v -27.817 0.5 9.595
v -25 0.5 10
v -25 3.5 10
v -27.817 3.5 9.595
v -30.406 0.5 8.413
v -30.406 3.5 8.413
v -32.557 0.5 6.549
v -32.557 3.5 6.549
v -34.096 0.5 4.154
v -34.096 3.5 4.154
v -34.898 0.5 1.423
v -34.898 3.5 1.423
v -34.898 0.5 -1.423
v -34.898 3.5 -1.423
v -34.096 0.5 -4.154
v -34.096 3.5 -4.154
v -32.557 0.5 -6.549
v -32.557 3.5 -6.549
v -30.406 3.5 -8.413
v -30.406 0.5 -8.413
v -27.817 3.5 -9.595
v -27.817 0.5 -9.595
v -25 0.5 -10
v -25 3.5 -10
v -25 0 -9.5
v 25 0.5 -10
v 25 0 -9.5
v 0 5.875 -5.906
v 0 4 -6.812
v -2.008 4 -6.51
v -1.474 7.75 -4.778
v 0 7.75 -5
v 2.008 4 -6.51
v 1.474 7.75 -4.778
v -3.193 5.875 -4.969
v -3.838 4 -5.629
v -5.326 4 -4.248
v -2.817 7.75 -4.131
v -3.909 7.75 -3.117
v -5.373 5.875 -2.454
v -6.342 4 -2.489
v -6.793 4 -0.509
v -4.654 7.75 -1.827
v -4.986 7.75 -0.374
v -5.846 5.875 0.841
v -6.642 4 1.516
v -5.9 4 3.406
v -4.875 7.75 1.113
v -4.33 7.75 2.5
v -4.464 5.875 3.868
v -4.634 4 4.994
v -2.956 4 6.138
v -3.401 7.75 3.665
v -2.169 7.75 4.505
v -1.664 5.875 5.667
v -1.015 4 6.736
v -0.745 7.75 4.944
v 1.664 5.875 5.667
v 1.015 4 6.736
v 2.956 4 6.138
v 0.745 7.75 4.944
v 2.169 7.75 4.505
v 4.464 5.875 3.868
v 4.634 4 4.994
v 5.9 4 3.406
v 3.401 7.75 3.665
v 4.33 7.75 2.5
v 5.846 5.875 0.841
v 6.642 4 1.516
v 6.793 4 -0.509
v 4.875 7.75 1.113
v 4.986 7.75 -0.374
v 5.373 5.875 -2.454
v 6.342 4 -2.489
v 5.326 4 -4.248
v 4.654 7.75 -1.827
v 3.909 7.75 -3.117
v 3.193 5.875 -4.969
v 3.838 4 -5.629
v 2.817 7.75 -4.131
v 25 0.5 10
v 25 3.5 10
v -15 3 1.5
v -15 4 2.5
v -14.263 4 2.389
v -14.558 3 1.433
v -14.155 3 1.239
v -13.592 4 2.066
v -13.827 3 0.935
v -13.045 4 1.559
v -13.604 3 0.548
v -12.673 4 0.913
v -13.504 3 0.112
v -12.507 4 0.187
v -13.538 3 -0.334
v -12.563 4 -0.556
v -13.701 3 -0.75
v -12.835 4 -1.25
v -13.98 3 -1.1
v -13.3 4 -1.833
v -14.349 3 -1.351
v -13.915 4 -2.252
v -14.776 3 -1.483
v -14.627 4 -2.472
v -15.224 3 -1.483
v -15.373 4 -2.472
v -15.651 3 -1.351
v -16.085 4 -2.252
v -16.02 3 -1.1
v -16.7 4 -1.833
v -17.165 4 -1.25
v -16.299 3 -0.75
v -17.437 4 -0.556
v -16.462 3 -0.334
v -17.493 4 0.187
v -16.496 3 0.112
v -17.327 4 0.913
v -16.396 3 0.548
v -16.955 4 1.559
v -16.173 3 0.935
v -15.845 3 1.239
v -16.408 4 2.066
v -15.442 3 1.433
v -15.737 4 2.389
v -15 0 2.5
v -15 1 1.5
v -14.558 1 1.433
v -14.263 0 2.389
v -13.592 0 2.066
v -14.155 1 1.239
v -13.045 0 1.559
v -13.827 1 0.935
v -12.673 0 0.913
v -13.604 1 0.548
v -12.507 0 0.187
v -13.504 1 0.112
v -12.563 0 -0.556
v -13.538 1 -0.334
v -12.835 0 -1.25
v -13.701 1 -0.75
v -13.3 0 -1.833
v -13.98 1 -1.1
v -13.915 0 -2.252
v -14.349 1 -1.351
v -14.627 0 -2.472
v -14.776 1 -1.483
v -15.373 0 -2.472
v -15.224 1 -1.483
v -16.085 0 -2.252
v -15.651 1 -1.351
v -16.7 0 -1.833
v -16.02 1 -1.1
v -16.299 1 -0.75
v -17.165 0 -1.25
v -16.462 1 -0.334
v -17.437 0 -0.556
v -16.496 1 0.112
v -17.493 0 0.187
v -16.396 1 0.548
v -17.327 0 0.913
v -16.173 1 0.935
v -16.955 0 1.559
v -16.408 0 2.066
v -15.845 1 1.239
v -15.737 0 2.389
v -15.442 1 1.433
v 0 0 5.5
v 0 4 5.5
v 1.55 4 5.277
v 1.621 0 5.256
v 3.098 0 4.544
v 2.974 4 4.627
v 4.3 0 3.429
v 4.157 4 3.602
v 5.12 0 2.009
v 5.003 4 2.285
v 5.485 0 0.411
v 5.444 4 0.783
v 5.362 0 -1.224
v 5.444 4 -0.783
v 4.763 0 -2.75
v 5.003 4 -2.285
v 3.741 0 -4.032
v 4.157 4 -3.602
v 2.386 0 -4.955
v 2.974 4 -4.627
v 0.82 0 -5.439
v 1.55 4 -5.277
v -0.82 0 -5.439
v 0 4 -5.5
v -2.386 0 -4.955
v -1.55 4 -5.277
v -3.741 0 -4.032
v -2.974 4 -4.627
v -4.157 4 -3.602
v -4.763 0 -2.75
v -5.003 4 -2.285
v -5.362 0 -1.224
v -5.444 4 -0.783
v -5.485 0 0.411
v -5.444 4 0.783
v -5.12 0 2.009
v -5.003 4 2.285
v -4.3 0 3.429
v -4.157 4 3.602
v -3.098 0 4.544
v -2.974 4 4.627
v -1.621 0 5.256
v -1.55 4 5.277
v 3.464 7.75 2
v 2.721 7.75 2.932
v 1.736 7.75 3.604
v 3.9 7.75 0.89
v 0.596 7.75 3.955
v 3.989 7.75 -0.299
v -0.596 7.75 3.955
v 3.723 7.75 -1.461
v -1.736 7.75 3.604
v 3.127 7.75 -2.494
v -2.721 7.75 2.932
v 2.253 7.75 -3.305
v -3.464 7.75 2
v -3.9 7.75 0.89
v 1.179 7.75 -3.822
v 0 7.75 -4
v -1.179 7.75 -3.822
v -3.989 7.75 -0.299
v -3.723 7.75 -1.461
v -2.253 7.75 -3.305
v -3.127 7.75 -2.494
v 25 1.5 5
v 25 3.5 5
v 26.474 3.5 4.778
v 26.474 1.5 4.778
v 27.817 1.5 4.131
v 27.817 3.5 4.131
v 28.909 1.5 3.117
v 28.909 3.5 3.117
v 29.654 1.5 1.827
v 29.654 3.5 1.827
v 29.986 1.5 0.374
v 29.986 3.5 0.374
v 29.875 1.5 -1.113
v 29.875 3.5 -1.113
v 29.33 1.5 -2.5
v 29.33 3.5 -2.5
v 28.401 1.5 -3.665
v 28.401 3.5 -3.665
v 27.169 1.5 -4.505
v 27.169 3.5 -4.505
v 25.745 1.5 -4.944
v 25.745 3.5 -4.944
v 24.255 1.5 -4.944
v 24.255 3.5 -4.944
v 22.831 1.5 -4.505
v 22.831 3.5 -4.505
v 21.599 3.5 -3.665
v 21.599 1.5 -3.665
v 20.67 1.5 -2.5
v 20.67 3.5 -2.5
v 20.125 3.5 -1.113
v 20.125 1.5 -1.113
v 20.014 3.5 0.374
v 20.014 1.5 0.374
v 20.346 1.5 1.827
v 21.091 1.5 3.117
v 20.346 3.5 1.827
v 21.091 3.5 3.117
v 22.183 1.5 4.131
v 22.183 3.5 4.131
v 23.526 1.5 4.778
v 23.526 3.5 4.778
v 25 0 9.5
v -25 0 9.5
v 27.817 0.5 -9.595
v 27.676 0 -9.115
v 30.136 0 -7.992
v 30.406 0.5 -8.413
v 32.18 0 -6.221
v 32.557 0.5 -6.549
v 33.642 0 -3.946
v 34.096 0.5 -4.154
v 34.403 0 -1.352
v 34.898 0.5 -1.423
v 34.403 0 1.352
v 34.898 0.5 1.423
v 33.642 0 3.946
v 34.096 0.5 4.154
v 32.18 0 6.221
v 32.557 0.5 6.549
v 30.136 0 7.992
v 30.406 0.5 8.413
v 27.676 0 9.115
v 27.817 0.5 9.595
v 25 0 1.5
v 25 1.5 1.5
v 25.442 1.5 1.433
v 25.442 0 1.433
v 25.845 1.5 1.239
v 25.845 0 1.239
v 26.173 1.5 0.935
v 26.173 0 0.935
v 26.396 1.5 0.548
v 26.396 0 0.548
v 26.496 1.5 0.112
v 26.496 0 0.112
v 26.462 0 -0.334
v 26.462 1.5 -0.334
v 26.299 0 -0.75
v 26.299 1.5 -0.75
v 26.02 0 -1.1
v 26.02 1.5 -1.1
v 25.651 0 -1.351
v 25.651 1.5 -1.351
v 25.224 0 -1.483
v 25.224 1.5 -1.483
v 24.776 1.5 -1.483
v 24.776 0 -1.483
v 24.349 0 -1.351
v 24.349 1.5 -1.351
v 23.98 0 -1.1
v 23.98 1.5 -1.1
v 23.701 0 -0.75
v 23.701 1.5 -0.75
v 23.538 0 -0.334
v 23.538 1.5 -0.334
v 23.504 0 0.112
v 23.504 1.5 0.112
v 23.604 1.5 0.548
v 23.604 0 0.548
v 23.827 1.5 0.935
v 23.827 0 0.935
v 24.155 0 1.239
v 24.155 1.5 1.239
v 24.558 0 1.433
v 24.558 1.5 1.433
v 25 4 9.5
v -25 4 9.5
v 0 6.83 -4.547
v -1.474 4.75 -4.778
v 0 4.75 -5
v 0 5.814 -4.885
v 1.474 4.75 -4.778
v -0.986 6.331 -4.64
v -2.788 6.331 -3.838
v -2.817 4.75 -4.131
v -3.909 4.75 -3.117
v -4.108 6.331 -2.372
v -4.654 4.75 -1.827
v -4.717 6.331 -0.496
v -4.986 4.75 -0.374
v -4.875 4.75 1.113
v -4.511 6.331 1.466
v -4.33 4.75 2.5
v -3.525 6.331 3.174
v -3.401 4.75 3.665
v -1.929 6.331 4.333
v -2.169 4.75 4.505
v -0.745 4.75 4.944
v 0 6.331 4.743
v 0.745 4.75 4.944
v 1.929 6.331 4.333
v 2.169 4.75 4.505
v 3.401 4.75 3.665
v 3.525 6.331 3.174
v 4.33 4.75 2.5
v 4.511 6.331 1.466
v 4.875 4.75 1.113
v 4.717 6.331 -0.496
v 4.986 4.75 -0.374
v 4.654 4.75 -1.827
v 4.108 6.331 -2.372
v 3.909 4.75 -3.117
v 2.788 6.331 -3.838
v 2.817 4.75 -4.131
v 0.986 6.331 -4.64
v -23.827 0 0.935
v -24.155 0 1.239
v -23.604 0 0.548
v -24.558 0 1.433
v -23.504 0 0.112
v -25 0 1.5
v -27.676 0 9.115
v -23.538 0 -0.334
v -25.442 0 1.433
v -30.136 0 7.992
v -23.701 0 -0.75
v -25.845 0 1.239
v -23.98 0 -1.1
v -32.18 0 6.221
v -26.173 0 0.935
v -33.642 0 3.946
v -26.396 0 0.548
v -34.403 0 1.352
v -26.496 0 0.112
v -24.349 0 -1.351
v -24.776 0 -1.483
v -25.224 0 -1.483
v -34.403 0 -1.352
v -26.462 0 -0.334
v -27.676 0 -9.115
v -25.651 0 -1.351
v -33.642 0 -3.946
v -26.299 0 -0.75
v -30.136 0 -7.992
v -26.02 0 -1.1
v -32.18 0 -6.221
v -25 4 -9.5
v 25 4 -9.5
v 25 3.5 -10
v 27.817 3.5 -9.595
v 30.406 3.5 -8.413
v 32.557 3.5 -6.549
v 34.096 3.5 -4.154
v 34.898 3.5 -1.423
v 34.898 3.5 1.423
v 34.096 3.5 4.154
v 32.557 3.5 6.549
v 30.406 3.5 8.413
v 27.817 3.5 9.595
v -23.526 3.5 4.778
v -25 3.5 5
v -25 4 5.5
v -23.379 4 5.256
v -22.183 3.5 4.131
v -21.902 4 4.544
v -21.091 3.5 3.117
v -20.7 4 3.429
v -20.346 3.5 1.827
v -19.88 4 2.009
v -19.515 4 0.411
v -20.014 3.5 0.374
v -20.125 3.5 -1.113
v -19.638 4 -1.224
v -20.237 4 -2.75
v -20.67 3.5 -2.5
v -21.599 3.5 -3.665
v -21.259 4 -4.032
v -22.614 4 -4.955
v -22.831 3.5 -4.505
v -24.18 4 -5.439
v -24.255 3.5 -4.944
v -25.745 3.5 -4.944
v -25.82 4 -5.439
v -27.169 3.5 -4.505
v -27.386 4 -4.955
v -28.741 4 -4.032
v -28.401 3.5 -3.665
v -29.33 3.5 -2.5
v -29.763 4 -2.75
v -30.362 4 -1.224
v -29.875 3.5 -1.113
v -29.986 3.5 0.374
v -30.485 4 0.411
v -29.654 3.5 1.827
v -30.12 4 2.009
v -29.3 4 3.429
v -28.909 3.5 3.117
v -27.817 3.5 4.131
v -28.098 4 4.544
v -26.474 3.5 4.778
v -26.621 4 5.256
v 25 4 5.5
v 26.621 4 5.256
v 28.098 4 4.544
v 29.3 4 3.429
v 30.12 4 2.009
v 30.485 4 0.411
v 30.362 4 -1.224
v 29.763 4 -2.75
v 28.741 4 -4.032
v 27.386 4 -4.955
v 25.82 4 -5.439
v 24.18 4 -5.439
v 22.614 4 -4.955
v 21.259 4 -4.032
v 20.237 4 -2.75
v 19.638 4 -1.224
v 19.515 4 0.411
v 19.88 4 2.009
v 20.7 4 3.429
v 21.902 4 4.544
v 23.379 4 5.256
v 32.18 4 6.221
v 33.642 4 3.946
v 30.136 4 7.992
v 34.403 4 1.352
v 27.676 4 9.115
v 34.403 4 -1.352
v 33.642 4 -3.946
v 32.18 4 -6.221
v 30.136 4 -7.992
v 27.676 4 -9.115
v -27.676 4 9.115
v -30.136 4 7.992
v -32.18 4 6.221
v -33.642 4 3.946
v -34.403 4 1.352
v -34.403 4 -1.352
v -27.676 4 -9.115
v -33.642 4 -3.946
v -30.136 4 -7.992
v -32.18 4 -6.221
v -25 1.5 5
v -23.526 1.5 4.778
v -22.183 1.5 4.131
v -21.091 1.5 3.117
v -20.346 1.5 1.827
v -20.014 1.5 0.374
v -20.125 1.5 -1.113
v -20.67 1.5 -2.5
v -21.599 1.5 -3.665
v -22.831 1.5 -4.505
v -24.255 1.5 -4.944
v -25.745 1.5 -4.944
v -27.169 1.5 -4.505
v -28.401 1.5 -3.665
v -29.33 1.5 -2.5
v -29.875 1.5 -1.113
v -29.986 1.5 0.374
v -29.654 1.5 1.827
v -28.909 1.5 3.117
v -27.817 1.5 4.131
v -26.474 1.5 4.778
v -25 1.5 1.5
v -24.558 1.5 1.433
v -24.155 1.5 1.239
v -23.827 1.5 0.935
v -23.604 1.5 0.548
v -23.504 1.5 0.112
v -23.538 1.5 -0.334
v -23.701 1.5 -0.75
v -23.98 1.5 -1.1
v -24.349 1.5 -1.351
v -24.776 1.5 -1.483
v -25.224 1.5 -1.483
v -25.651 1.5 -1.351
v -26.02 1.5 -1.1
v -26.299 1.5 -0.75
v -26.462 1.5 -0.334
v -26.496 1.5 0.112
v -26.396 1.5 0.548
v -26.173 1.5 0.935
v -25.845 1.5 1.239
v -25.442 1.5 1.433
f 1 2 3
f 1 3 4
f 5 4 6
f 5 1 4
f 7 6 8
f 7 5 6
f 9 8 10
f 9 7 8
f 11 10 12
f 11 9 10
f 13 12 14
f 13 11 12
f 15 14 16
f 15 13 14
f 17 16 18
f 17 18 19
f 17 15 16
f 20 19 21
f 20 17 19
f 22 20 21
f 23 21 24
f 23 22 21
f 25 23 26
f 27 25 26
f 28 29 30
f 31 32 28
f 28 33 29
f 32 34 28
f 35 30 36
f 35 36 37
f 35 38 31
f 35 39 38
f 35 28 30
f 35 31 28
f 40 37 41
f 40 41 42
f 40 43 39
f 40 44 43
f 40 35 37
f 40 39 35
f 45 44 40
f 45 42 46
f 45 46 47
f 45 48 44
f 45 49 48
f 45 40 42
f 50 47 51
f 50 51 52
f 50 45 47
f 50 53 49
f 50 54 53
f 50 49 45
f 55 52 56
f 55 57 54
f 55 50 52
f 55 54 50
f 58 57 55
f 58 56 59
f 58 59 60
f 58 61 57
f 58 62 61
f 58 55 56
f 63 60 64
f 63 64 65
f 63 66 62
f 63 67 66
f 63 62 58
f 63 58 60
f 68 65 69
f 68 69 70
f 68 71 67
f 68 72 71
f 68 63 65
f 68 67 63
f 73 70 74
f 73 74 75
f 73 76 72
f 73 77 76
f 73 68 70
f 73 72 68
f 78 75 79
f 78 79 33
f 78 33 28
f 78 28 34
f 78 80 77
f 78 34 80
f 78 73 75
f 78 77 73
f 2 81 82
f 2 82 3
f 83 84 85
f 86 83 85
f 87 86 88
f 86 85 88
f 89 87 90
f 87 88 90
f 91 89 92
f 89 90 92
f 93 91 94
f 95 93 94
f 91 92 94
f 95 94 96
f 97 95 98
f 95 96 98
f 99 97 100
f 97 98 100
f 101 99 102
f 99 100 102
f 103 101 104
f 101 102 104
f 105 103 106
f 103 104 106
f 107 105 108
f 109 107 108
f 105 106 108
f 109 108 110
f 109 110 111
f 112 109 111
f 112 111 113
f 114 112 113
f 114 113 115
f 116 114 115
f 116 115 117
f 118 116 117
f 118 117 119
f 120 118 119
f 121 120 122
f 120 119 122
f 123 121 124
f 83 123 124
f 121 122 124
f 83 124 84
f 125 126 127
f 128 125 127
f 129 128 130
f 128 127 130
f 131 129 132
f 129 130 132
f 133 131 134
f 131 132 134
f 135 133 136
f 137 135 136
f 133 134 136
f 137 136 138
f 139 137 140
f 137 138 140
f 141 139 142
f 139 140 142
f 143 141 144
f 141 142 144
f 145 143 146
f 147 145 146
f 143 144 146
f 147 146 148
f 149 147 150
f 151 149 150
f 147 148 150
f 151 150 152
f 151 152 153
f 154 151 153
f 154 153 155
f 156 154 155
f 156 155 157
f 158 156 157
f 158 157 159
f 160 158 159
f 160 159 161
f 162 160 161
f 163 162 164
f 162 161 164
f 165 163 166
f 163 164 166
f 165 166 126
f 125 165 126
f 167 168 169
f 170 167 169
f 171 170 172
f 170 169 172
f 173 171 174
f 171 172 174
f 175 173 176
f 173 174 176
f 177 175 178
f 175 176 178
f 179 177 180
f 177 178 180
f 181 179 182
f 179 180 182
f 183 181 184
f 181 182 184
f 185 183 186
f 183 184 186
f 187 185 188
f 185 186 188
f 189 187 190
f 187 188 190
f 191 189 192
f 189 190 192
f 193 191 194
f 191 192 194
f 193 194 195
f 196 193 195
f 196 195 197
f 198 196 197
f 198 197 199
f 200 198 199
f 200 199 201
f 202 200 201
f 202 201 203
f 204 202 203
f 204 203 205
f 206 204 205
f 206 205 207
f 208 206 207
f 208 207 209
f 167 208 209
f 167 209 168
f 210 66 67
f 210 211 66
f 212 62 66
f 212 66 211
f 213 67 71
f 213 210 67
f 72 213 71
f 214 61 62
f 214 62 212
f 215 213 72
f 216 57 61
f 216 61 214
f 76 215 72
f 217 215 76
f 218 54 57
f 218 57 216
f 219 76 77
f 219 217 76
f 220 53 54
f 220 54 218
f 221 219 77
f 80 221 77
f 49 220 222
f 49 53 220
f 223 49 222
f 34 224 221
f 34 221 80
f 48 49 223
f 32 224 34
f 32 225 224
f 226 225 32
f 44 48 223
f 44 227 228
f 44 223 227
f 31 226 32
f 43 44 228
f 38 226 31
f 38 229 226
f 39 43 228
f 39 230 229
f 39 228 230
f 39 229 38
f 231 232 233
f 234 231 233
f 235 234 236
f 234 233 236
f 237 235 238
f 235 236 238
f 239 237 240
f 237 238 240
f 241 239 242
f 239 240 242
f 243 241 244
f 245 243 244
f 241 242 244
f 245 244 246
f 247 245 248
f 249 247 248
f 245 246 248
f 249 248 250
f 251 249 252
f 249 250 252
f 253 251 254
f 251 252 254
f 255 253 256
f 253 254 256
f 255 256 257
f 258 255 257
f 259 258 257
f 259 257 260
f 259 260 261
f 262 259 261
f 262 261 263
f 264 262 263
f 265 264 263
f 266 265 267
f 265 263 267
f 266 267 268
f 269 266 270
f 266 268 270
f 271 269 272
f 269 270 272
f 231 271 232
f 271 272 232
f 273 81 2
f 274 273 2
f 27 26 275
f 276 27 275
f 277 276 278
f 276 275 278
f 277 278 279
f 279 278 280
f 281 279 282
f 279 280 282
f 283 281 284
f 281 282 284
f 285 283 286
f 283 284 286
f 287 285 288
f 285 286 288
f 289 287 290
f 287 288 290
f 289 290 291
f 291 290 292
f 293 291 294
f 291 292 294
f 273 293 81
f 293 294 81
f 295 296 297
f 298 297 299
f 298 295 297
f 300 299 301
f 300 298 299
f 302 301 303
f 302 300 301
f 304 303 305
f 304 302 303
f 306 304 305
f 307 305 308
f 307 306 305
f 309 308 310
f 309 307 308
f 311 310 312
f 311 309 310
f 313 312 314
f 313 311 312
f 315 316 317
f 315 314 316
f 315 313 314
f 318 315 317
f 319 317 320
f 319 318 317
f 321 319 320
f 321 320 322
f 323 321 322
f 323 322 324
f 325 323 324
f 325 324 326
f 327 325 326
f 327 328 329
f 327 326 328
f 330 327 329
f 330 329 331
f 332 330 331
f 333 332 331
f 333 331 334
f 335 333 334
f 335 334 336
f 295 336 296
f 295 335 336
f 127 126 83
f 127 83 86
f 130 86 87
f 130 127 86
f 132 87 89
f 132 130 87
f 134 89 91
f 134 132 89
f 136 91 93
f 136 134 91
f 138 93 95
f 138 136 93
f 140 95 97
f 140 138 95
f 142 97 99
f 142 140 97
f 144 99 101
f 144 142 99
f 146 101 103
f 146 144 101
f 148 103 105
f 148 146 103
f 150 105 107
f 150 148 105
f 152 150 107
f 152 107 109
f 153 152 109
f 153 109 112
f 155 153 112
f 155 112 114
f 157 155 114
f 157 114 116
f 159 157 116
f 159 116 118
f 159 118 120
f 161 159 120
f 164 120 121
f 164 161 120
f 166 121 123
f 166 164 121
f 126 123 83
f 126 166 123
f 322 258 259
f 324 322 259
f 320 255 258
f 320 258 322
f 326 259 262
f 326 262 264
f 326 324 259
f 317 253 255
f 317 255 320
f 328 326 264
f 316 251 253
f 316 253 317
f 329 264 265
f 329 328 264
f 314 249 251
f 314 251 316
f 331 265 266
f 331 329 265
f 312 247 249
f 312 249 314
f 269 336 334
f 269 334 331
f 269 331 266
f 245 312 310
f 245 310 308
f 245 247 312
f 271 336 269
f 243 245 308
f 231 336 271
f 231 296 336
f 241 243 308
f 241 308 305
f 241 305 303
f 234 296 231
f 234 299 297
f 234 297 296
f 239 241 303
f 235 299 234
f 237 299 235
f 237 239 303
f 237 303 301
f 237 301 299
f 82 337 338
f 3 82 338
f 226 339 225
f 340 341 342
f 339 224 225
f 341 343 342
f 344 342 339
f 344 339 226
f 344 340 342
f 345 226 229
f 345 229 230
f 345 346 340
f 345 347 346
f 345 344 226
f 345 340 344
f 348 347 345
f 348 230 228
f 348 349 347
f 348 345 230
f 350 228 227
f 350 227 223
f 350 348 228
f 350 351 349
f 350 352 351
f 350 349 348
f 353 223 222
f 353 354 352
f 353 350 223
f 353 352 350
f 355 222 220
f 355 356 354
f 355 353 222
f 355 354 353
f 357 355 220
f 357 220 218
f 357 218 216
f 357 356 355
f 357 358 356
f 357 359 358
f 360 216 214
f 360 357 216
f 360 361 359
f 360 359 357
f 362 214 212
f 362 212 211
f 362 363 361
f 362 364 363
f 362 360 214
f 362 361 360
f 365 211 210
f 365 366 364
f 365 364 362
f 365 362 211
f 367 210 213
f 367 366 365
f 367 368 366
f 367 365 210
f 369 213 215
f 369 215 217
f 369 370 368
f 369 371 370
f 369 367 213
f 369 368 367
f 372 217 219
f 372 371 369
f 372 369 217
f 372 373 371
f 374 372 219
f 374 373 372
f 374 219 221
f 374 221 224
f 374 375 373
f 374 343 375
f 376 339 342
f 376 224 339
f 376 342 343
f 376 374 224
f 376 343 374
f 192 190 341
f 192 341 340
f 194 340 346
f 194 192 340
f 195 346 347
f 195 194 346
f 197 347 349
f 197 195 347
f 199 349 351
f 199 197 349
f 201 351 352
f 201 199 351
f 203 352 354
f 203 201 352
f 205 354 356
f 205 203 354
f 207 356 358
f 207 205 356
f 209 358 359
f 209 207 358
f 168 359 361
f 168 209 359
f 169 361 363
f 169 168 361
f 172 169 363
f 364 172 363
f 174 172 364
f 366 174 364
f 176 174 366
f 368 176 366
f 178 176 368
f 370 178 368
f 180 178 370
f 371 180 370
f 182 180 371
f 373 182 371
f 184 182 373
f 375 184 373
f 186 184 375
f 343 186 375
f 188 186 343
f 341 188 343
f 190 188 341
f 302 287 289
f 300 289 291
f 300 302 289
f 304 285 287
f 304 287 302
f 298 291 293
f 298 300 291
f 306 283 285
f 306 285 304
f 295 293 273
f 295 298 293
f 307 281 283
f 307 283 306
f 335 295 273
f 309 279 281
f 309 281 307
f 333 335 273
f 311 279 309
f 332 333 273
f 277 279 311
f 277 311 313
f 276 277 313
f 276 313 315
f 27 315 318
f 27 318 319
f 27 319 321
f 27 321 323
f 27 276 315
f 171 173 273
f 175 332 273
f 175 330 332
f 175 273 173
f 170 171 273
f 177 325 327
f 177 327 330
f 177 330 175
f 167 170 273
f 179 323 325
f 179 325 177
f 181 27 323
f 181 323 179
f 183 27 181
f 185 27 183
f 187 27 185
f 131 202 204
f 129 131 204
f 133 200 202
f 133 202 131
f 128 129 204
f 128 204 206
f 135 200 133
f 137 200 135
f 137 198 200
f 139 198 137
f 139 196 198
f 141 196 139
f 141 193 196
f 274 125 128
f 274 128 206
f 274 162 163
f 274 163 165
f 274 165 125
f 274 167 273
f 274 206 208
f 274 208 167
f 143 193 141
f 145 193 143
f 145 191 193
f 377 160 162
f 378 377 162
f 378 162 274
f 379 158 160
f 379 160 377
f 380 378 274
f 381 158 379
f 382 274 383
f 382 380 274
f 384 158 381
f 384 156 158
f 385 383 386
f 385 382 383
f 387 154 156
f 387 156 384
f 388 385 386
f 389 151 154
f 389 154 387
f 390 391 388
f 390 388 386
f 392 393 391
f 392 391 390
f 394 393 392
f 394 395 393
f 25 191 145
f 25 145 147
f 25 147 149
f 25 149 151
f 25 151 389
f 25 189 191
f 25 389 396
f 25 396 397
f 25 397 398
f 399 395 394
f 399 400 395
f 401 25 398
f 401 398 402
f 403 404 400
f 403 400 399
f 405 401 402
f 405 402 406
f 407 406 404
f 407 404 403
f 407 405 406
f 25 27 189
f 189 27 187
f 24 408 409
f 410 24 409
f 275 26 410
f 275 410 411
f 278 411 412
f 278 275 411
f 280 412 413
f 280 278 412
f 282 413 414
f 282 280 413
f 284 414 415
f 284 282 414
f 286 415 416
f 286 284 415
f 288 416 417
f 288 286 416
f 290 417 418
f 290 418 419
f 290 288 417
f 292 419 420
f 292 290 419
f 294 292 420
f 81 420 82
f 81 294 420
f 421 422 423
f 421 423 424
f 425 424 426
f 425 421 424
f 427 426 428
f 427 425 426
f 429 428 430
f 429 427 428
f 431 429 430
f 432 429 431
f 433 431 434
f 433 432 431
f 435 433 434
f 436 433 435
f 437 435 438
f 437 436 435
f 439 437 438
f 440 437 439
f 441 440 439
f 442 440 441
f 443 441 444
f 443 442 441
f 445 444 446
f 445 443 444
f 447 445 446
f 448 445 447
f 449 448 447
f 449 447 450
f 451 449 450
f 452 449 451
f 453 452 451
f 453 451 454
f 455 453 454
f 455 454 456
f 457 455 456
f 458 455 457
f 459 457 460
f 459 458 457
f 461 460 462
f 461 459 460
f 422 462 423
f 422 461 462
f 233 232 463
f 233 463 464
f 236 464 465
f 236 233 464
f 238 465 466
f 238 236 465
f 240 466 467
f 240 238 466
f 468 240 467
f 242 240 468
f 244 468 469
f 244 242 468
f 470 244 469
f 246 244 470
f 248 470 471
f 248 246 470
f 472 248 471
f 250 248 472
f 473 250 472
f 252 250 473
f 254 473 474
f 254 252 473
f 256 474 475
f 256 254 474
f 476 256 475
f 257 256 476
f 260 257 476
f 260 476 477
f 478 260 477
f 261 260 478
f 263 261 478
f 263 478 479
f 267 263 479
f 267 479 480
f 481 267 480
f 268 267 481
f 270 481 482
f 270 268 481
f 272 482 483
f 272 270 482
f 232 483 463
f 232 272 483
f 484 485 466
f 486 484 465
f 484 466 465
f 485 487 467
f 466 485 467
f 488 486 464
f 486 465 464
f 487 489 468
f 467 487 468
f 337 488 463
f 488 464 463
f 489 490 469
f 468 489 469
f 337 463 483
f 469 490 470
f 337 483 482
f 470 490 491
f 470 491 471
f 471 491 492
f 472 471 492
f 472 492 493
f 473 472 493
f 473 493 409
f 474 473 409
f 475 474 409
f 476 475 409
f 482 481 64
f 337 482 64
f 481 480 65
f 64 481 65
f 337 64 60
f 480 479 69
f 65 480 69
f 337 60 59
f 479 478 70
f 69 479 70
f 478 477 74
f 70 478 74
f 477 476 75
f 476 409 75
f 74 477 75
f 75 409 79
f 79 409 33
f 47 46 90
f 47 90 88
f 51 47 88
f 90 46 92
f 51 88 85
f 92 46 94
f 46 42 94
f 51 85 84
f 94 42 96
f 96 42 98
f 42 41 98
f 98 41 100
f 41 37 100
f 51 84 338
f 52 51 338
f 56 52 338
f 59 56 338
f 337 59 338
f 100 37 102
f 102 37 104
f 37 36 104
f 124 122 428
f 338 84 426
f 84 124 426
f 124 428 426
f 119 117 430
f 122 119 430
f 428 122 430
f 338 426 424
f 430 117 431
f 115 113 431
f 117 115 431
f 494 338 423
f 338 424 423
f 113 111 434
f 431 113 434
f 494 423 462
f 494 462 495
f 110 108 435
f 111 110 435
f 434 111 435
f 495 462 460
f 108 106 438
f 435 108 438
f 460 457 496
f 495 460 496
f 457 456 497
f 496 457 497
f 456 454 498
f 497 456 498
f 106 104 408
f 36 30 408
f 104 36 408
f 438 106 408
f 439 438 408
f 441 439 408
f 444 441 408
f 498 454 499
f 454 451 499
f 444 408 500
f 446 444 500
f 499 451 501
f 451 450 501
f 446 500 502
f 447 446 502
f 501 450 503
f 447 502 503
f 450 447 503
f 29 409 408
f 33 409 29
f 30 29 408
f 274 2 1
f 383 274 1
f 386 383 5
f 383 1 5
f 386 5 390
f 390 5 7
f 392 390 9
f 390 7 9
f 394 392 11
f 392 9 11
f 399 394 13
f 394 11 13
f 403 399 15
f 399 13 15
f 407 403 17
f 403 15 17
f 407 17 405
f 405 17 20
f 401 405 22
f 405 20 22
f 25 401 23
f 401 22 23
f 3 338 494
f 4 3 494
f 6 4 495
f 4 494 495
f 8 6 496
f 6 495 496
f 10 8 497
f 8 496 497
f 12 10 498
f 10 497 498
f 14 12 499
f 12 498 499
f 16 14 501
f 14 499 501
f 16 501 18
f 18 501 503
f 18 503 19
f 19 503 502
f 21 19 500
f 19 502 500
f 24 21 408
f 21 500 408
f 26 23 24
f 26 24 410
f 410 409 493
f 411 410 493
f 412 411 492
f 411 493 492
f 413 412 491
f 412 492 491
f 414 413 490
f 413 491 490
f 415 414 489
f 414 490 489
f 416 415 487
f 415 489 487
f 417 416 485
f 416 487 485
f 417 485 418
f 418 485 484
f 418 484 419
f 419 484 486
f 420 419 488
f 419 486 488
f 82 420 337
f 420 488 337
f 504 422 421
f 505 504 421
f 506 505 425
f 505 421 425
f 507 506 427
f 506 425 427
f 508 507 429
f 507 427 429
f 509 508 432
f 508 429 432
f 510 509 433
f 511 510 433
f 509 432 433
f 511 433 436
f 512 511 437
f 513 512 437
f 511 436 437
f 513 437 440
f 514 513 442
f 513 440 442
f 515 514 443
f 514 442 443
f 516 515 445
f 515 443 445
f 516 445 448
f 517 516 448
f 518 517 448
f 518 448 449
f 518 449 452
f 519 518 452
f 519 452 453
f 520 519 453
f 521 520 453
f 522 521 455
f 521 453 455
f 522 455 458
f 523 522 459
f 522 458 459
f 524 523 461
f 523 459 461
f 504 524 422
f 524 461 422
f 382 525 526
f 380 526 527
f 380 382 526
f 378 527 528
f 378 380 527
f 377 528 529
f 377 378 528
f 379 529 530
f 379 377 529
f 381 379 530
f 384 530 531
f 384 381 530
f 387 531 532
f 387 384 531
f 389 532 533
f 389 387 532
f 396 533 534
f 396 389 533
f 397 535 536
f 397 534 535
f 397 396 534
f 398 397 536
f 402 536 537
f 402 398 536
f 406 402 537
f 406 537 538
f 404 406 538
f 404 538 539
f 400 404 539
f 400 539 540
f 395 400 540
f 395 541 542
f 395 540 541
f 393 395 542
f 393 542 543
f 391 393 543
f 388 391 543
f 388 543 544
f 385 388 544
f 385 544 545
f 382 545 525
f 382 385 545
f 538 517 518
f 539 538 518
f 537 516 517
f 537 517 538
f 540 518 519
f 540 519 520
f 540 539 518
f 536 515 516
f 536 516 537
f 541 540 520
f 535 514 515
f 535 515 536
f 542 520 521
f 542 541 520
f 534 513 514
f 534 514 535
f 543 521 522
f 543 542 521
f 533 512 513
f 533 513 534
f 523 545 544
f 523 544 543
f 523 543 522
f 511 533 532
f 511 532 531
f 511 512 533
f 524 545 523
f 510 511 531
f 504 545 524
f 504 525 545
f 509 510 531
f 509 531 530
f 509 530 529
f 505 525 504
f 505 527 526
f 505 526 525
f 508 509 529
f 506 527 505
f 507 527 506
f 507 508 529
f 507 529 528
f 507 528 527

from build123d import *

# Parameters (mm, degrees)
CROQUIS2_R              = 1.5
SALIENTE_EXTRUIR1_DEPTH = 4
CROQUIS3_R              = 5
CORTAR_EXTRUIR1_DEPTH   = 2.5
CROQUIS6_R              = 5.5
CORTAR_EXTRUIR2_DEPTH   = 37.619666847
CHAFL_N1_SIZE           = 1
CHAFL_N2_SIZE           = 0.5


with BuildPart() as part:
    # Croquis2 → Saliente-Extruir1 (new body)
    with BuildSketch(Plane(origin=(0, 0, 0), x_dir=(1, 0, 0), z_dir=(0, 1, 0))):
        with BuildLine():
            Line((-25, 10), (25, 10))
            ThreePointArc((25, 10), (35, 0), (25, -10))
            Line((25, -10), (-25, -10))
            ThreePointArc((-25, -10), (-35, 0), (-25, 10))
        make_face()
        with Locations(Location((-25, 0, 0), (0, 0, 270))):
            Circle(CROQUIS2_R, mode=Mode.SUBTRACT)
        with Locations(Location((25, 0, 0), (0, 0, 270))):
            Circle(CROQUIS2_R, mode=Mode.SUBTRACT)
        with Locations(Location((-15, 0, 0), (0, 0, 270))):
            Circle(CROQUIS2_R, mode=Mode.SUBTRACT)
    extrude(amount=SALIENTE_EXTRUIR1_DEPTH)

    # Croquis3 → Cortar-Extruir1 (cut)
    with BuildSketch(Plane(origin=(0, 4, 0), x_dir=(1, 0, 0), z_dir=(0, 1, 0))):
        with Locations(Location((-25, 0, 0), (0, 0, 270))):
            Circle(CROQUIS3_R)
        with Locations(Location((25, 0, 0), (0, 0, 270))):
            Circle(CROQUIS3_R)
    extrude(amount=-CORTAR_EXTRUIR1_DEPTH, mode=Mode.SUBTRACT)

    # Croquis6 → Cortar-Extruir2 (cut, through all)
    with BuildSketch(Plane(origin=(0, 4, 0), x_dir=(1, 0, 0), z_dir=(0, 1, 0))):
        with Locations(Location((0, 0, 0), (0, 0, 270))):
            Circle(CROQUIS6_R)
    extrude(amount=-CORTAR_EXTRUIR2_DEPTH, mode=Mode.SUBTRACT)

    # Croquis5 → Revolución1 (revolve)
    with BuildSketch(Plane.XY, mode=Mode.PRIVATE) as revoluci_n1_sk:
        with BuildLine():
            Line((5, 4.75), (5.5, 4))
            Line((5.5, 4), (6.8125, 4))
            Line((6.8125, 4), (5, 7.75))
            Line((5, 7.75), (4, 7.75))
            ThreePointArc((4, 7.75), (4.74341649, 6.33113883), (5, 4.75))
        make_face()
    revolve(revoluci_n1_sk.sketch.rotate(Axis((0, -0.25, 0), (0, 1, 0)), 90), axis=Axis((0, -0.25, 0), (0, 1, 0)))

    # Chaflán1
    chafl_n1_edges = [part.edges().sort_by_distance(p)[0] for p in [
        (-15, 0, -1.5),
        (-15, 4, -1.5),
    ]]
    chamfer(chafl_n1_edges, length=CHAFL_N1_SIZE)

    # Chaflán2
    chafl_n2_edges = [part.edges().sort_by_distance(p)[0] for p in [
        (35, 4, 0),
        (0, 4, -10),
        (-25, 4, -5),
        (25, 4, -5),
        (-35, 4, 0),
        (0, 0, -10),
        (35, 0, 0),
        (0, 0, 10),
        (-35, 0, 0),
        (0, 4, 10),
    ]]
    chamfer(chafl_n2_edges, length=CHAFL_N2_SIZE)


solid = part.part
